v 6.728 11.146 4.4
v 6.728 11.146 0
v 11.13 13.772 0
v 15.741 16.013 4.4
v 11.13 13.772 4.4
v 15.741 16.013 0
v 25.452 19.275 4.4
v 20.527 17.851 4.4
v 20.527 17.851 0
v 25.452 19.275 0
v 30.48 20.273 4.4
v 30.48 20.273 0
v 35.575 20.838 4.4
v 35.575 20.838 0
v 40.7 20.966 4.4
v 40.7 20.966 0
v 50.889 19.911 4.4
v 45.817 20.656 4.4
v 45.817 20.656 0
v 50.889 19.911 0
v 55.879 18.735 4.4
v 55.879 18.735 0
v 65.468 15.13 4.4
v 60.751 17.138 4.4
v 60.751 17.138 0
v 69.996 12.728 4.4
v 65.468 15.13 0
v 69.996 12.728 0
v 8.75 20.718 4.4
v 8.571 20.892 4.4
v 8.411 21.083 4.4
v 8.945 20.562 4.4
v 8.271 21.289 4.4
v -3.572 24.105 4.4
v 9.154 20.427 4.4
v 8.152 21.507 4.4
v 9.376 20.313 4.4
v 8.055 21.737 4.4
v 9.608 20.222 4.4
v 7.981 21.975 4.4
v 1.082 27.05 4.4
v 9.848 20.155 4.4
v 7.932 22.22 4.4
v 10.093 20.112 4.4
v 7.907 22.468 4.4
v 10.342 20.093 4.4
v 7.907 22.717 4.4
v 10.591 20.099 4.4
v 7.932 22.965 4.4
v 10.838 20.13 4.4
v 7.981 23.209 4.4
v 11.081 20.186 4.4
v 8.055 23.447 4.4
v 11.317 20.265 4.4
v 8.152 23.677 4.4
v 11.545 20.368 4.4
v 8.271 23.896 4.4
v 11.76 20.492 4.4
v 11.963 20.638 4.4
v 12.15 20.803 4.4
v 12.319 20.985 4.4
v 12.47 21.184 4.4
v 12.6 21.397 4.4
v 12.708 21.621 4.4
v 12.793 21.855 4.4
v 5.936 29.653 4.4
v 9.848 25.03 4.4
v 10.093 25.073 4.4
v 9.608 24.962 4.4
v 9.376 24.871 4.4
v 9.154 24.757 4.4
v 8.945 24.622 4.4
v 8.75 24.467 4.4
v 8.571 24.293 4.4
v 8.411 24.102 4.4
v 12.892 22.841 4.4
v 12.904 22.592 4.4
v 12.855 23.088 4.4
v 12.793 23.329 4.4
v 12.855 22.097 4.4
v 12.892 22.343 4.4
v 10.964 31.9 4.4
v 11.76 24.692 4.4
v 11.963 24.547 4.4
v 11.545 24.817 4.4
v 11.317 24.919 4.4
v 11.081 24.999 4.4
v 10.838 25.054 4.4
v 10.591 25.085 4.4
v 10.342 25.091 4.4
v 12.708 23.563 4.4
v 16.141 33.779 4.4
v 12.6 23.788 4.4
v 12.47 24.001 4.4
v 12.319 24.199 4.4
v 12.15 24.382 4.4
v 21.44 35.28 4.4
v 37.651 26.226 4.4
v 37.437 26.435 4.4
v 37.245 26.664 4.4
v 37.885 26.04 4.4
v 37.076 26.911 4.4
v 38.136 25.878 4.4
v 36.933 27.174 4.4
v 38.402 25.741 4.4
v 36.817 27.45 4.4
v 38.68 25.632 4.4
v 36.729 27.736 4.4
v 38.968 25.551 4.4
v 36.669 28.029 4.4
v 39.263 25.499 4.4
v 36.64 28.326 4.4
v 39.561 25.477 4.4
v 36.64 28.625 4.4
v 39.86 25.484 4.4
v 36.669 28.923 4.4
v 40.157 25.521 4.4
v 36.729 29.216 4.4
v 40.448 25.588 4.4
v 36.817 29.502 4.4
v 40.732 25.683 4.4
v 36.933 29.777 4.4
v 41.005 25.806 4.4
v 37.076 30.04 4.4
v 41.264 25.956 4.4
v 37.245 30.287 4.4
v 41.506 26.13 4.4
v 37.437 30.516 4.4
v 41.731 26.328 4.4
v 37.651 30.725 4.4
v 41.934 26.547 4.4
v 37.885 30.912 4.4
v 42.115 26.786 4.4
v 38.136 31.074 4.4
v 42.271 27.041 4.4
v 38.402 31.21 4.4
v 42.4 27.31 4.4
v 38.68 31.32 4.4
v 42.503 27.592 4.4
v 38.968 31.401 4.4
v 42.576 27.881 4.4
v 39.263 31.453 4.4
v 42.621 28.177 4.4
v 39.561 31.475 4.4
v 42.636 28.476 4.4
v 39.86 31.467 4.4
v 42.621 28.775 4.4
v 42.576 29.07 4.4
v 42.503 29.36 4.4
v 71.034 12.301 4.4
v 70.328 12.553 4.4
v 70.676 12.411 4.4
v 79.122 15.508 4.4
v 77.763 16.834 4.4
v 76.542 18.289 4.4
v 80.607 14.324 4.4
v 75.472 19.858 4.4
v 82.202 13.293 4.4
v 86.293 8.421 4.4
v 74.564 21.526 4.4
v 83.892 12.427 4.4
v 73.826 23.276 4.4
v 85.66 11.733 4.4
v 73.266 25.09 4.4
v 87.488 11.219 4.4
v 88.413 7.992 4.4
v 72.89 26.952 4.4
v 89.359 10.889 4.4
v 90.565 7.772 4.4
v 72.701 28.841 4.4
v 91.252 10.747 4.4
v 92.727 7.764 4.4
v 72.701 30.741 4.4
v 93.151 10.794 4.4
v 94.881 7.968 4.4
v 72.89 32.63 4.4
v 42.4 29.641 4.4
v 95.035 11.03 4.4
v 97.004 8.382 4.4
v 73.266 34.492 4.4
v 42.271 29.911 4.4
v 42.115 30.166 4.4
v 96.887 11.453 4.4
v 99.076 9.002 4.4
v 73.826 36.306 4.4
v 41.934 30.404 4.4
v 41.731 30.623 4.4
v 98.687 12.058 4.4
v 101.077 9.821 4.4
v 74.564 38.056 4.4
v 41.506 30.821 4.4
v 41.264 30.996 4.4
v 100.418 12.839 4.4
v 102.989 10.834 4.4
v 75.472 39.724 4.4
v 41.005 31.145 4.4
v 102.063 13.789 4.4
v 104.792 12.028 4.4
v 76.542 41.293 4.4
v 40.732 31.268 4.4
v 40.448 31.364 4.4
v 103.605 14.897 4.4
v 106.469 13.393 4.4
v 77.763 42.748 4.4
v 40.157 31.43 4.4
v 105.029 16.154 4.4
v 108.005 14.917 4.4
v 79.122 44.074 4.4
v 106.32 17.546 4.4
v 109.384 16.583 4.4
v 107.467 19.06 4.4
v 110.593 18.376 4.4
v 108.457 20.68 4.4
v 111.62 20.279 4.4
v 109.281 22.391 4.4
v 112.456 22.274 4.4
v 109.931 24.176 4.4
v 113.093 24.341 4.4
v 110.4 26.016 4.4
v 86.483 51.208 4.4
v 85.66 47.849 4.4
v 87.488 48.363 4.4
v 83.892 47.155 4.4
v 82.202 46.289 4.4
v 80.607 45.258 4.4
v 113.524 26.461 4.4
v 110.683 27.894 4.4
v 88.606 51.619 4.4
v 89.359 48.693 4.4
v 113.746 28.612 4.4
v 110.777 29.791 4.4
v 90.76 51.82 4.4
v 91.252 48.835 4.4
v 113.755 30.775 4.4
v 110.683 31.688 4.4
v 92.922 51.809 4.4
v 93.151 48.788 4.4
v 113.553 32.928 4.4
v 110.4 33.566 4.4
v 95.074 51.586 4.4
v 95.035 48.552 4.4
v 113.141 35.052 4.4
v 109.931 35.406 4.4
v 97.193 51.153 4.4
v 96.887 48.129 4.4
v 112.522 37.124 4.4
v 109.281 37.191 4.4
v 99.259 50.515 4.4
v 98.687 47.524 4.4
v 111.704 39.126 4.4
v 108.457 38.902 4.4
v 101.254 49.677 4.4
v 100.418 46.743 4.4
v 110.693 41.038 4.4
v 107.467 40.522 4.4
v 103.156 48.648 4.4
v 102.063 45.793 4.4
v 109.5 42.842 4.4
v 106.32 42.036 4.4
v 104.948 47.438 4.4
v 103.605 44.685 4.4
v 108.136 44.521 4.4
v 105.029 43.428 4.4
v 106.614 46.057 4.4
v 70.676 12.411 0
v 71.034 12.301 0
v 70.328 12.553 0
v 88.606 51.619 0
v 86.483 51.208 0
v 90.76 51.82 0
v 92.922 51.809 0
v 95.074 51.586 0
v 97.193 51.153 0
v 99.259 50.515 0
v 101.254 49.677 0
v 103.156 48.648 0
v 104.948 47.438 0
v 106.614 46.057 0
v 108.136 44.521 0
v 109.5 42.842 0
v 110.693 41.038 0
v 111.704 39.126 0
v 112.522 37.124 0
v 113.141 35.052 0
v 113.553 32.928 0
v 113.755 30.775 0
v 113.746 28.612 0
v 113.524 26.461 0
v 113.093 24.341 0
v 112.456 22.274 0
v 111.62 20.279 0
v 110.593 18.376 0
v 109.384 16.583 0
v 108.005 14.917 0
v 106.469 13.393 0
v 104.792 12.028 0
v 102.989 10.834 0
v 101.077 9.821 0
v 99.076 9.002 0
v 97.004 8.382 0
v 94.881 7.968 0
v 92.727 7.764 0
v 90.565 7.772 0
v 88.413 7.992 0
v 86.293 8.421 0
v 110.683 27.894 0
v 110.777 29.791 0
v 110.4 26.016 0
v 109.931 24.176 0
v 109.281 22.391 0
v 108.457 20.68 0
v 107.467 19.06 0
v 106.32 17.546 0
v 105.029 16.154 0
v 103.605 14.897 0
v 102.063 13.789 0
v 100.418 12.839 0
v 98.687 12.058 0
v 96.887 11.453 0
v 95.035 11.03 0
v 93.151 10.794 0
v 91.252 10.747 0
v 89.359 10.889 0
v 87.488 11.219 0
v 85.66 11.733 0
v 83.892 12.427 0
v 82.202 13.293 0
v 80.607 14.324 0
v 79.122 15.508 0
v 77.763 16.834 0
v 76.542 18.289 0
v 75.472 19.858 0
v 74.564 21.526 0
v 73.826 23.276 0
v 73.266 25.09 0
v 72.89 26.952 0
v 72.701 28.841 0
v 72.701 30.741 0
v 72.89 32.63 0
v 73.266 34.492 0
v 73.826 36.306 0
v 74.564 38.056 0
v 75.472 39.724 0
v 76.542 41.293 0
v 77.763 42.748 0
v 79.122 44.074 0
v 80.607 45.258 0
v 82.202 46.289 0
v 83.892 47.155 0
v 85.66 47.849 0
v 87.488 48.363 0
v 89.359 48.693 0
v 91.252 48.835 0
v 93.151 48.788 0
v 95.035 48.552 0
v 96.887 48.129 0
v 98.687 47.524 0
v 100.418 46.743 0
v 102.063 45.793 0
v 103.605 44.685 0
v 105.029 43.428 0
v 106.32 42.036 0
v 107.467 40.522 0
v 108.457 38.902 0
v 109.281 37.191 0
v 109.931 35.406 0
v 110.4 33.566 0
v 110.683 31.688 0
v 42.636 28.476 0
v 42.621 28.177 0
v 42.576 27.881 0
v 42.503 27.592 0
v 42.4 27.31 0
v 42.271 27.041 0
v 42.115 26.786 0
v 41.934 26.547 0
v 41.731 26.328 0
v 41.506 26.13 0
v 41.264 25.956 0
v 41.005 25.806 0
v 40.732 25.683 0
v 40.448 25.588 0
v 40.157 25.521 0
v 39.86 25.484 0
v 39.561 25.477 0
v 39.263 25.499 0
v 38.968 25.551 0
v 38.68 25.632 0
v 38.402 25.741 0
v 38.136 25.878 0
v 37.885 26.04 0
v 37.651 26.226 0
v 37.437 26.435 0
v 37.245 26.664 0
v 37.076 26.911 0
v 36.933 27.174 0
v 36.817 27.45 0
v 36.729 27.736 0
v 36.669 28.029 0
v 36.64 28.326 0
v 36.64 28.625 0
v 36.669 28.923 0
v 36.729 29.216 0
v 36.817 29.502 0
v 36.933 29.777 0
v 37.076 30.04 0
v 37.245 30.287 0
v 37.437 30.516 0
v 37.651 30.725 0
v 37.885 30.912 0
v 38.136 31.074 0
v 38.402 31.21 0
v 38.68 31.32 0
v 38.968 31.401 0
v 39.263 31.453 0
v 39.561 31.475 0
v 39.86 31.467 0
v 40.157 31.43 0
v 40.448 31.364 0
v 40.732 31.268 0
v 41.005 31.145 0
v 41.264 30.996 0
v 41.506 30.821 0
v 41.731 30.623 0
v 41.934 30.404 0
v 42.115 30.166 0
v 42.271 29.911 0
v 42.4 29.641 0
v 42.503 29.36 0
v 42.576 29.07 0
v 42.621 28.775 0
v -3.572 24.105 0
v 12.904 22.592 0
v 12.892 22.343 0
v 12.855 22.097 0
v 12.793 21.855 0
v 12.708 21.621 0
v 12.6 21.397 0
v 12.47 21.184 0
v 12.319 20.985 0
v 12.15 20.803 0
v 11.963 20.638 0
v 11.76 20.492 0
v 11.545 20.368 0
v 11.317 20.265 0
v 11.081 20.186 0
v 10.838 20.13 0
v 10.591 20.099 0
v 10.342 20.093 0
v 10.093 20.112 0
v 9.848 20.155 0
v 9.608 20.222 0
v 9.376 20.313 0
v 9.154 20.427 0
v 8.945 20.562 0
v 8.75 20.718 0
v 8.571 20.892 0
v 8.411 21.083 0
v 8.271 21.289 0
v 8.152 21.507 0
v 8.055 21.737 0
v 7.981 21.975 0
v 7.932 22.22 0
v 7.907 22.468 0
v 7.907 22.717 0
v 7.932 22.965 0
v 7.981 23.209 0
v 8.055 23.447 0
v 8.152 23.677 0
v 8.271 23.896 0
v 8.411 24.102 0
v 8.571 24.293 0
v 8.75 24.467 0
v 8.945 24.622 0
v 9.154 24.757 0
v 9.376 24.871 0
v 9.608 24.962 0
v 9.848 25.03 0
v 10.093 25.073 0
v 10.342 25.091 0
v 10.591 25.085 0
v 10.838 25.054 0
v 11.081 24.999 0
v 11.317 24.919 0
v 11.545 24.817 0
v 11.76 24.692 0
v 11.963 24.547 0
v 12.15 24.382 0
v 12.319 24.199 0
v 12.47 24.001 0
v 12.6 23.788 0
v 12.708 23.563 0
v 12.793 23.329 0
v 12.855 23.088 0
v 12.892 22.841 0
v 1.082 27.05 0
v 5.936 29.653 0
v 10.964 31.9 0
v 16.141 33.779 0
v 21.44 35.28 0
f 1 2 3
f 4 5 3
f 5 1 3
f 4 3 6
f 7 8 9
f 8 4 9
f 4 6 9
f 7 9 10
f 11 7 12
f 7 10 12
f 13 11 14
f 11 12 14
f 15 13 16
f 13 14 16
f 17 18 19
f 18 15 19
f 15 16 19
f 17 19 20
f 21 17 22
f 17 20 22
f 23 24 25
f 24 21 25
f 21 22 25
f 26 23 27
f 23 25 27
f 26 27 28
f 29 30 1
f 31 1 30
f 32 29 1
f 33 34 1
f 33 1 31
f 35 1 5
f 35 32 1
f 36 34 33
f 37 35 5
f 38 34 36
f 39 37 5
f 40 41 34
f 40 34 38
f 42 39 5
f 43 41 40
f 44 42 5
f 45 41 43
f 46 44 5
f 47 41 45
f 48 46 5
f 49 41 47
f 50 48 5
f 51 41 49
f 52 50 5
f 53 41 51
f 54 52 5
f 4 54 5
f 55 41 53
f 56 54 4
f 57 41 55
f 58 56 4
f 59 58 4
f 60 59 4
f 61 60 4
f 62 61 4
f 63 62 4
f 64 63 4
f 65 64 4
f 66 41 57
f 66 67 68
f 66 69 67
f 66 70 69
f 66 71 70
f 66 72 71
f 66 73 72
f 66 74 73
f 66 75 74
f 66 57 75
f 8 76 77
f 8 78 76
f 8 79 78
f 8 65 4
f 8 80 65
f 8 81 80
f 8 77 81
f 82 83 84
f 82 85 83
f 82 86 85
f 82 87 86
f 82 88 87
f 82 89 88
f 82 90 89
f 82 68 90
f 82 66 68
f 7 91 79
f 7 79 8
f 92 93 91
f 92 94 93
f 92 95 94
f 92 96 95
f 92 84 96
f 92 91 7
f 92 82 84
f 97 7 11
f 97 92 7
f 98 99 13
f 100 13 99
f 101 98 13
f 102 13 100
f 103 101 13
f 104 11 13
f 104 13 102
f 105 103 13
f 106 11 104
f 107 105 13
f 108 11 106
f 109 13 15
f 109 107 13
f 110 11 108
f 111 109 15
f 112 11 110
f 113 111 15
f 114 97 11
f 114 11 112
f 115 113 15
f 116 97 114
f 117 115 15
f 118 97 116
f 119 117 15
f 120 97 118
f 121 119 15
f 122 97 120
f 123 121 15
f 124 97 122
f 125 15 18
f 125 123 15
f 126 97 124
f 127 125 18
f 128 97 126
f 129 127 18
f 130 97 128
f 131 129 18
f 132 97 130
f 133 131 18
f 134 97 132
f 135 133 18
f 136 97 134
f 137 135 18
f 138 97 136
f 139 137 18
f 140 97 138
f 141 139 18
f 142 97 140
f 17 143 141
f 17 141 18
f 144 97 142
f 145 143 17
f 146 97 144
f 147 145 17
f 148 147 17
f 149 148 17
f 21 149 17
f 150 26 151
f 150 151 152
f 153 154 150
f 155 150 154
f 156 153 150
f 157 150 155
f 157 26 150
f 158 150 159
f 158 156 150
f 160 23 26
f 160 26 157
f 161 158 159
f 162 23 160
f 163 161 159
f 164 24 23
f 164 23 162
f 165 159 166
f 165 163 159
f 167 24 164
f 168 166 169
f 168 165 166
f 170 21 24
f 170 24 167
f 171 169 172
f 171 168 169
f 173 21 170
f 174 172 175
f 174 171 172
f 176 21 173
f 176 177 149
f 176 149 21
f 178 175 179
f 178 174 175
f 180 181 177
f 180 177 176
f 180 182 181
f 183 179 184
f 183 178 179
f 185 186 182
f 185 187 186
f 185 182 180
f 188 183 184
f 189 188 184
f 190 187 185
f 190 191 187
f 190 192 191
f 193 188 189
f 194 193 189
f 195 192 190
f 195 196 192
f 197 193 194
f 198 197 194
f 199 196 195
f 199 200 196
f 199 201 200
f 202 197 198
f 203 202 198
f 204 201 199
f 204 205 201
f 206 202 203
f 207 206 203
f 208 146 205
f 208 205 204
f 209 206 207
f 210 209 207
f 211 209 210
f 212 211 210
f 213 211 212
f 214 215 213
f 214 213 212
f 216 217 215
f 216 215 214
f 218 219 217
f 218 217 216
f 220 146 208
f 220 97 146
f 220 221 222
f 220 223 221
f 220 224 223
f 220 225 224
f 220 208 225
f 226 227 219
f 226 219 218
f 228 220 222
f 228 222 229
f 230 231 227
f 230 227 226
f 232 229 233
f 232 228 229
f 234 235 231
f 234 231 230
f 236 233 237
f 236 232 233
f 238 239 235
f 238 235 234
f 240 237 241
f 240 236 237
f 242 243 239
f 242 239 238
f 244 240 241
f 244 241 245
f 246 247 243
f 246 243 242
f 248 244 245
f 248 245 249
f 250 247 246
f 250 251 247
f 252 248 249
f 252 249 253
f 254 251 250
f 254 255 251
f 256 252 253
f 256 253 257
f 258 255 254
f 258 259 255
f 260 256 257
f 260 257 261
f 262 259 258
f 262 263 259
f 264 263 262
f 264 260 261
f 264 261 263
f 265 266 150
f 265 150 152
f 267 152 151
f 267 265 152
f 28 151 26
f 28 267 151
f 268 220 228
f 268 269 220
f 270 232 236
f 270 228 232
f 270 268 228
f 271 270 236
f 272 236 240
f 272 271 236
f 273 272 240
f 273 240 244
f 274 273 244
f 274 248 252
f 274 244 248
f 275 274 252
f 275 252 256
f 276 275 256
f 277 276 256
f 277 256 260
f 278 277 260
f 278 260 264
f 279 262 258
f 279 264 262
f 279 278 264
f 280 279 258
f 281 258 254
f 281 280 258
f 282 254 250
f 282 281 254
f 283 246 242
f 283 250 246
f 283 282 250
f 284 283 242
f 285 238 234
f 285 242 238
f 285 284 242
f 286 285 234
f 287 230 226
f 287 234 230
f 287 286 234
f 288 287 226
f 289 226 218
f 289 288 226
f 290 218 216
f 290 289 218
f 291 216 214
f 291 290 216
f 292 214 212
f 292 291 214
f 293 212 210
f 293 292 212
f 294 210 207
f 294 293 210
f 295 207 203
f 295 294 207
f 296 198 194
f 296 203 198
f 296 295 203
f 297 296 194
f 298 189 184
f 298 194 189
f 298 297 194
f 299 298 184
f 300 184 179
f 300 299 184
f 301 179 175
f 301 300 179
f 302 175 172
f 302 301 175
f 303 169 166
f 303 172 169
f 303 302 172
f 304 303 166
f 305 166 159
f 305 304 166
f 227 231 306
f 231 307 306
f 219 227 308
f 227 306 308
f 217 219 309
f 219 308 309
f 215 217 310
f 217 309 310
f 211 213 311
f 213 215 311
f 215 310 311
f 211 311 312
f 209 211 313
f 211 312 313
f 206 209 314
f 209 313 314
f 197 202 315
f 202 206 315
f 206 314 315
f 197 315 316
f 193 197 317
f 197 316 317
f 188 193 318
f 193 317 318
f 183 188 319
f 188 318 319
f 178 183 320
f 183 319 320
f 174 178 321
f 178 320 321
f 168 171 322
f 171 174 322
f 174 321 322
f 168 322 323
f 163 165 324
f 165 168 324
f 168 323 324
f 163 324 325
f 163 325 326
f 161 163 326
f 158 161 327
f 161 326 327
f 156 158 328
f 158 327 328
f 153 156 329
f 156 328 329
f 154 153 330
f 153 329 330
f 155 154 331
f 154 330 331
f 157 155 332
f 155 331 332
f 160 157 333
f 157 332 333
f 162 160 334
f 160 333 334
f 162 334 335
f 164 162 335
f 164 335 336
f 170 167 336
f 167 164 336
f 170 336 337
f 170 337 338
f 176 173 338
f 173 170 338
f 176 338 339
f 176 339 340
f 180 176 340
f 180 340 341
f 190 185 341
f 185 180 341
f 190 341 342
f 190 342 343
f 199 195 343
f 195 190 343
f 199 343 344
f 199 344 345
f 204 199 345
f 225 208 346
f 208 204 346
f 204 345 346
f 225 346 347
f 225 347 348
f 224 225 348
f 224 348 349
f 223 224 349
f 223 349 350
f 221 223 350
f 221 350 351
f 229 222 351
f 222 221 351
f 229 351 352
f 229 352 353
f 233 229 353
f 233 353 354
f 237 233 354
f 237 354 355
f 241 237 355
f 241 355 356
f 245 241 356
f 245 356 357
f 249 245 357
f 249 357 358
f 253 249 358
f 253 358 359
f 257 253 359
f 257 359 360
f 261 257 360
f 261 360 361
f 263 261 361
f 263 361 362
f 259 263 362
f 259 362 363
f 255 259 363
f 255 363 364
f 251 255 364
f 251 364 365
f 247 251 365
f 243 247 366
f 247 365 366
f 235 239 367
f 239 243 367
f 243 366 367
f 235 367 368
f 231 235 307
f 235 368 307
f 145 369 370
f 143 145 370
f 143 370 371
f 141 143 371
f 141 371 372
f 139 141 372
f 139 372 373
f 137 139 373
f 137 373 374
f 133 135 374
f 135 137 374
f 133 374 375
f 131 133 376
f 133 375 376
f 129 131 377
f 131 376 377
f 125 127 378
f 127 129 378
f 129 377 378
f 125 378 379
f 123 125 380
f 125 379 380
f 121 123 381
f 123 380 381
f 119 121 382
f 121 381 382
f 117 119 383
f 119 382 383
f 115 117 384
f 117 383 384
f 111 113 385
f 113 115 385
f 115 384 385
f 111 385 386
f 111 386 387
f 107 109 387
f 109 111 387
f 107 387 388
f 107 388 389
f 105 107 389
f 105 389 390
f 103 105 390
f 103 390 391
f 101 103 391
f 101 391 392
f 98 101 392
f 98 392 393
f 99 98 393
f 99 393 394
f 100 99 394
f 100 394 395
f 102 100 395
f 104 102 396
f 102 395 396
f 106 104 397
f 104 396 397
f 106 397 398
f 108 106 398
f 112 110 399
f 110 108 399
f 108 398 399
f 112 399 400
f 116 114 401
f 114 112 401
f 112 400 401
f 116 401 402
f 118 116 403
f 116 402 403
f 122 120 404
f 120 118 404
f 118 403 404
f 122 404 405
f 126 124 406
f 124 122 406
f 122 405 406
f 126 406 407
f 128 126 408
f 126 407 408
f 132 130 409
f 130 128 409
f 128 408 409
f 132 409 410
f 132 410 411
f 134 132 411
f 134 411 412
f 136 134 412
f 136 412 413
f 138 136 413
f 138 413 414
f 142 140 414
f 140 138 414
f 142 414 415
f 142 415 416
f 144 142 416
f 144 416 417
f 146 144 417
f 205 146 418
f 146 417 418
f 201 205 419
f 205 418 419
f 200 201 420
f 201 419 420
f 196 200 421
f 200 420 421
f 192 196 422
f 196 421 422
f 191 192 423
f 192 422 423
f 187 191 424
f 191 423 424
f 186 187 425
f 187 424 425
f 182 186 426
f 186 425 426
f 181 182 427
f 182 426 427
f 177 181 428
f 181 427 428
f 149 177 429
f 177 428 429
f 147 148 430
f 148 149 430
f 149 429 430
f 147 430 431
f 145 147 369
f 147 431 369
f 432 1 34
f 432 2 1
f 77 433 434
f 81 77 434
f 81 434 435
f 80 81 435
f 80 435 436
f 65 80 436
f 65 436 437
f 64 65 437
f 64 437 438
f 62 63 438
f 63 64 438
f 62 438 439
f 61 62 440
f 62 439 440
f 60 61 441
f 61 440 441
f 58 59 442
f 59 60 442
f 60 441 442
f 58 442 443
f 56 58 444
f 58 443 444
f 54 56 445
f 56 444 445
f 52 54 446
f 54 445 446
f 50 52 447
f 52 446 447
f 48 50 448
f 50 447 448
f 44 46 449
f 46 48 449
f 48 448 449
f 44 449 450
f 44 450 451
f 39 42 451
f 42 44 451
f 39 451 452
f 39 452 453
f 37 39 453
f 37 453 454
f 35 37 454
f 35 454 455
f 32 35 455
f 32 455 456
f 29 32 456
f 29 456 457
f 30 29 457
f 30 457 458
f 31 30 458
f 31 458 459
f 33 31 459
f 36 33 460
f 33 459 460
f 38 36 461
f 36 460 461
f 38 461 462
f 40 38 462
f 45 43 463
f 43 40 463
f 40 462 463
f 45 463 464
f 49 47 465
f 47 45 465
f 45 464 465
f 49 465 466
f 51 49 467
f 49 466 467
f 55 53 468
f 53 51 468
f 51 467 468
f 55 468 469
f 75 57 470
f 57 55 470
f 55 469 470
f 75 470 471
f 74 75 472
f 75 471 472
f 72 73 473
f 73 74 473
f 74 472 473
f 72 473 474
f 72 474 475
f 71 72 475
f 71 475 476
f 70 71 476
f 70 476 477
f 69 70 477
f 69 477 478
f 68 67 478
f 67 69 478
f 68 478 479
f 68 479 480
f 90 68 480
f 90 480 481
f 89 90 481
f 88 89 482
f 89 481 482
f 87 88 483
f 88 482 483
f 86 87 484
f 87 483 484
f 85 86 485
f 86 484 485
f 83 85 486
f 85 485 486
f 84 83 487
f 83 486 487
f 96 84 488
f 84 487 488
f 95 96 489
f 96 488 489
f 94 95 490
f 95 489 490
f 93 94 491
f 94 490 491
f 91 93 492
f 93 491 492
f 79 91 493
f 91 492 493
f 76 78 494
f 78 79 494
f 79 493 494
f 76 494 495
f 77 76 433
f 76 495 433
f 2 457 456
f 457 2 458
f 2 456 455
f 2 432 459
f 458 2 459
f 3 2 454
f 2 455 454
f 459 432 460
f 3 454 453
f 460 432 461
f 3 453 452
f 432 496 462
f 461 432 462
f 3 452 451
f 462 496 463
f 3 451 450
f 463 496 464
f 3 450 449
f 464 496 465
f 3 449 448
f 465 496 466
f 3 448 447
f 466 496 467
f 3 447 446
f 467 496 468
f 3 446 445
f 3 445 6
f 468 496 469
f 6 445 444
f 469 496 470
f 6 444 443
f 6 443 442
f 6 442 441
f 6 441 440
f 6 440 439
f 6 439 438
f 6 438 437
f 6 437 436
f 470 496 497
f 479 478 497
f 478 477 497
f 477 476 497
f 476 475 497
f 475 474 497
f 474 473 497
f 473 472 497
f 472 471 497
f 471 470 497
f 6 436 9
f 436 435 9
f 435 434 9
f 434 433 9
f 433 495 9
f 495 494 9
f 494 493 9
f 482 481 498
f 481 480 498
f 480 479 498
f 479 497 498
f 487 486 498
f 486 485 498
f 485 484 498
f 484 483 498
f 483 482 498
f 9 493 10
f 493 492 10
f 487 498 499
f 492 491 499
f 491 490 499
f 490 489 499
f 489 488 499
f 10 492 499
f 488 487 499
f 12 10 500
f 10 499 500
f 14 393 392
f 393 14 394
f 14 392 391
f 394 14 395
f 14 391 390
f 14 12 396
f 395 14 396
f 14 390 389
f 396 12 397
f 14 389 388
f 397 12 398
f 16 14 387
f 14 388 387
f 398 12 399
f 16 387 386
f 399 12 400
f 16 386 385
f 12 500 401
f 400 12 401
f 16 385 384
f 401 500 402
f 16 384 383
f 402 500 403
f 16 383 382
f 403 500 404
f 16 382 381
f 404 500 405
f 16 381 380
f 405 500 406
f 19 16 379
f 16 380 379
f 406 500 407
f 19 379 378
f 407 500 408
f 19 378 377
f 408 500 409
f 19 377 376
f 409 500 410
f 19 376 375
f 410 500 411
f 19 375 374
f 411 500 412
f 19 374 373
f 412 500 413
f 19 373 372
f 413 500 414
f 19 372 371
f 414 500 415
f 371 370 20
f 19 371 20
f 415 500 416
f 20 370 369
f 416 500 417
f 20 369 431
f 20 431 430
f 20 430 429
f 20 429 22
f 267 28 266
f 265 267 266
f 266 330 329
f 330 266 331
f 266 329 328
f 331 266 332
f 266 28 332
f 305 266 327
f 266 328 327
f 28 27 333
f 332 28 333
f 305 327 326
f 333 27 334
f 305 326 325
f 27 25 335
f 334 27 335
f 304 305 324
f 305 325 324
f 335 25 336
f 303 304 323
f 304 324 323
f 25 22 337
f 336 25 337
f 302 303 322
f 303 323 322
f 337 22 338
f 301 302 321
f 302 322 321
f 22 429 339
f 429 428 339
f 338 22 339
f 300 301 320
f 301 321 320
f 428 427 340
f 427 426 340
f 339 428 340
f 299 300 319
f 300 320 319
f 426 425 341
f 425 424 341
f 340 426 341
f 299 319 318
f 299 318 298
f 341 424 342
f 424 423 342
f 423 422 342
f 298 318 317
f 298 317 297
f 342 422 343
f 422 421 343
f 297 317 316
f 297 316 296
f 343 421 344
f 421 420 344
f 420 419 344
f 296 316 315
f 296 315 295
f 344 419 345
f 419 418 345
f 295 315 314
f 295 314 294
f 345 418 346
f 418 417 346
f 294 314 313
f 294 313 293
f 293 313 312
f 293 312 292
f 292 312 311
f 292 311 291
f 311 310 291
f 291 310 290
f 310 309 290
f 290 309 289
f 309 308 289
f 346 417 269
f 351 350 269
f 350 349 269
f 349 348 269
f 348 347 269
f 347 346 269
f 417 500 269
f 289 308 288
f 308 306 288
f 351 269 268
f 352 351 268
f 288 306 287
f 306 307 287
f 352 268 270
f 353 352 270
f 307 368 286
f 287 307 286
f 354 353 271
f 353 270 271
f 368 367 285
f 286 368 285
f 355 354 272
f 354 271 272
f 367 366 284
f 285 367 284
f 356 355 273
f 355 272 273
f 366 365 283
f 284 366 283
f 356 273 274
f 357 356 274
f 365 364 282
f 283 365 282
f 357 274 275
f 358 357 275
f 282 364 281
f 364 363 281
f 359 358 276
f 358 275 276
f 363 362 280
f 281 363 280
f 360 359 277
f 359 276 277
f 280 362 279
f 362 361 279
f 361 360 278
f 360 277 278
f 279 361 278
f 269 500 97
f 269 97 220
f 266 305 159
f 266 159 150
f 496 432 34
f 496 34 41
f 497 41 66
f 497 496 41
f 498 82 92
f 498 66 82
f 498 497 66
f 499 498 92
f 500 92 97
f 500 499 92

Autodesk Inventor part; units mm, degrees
ref_plane "YZ Plane" through (0, 0, 0) normal (1, 0, 0) x (0, 1, 0)
ref_plane "XZ Plane" through (0, 0, 0) normal (0, 1, 0) x (-1, 0, 0)
ref_plane "XY Plane" through (0, 0, 0) normal (0, 0, 1) x (1, 0, 0)
ref_plane "Work Plane1" through (0, 0, 0) normal (0, 0, 1) x (1, 0, 0)
sketch "Sketch1" plane through (0, 0, 0) normal (0, 0, 1) x (1, 0, 0)
  circle A0 centre (91.7273, 29.791) radius 19.05 projected
  circle A1 centre (39.6359, 28.4758) radius 3 projected
  arc A2 (69.9962, 12.7276) -> (6.7276, 11.146) centre (39.6359, -39.0242) ccw
  arc A3 (69.9962, 12.7276) -> (71.0345, 12.3011) centre (72.0202, 16.1778) ccw projected
  line L0 (86.2932, 8.4211) -> (71.0345, 12.3011) projected
  arc A4 (86.2932, 8.4211) -> (86.4826, 51.2082) centre (91.7273, 29.791) ccw projected
  line L1 (21.44, 35.2803) -> (86.4826, 51.2082) projected
  arc A5 (21.44, 35.2803) -> (-3.5721, 24.1052) centre (39.6359, -39.0242) ccw
  line L2 (6.7276, 11.146) -> (-3.5721, 24.1052) projected
  circle A6 centre (10.4041, 22.5922) radius 2.5 projected
  point P0 (0, 0)
extrude "Extrusion1" add sketch "Sketch1" along normal blind 4.4
properties part number "FrontMotorPlateB"
